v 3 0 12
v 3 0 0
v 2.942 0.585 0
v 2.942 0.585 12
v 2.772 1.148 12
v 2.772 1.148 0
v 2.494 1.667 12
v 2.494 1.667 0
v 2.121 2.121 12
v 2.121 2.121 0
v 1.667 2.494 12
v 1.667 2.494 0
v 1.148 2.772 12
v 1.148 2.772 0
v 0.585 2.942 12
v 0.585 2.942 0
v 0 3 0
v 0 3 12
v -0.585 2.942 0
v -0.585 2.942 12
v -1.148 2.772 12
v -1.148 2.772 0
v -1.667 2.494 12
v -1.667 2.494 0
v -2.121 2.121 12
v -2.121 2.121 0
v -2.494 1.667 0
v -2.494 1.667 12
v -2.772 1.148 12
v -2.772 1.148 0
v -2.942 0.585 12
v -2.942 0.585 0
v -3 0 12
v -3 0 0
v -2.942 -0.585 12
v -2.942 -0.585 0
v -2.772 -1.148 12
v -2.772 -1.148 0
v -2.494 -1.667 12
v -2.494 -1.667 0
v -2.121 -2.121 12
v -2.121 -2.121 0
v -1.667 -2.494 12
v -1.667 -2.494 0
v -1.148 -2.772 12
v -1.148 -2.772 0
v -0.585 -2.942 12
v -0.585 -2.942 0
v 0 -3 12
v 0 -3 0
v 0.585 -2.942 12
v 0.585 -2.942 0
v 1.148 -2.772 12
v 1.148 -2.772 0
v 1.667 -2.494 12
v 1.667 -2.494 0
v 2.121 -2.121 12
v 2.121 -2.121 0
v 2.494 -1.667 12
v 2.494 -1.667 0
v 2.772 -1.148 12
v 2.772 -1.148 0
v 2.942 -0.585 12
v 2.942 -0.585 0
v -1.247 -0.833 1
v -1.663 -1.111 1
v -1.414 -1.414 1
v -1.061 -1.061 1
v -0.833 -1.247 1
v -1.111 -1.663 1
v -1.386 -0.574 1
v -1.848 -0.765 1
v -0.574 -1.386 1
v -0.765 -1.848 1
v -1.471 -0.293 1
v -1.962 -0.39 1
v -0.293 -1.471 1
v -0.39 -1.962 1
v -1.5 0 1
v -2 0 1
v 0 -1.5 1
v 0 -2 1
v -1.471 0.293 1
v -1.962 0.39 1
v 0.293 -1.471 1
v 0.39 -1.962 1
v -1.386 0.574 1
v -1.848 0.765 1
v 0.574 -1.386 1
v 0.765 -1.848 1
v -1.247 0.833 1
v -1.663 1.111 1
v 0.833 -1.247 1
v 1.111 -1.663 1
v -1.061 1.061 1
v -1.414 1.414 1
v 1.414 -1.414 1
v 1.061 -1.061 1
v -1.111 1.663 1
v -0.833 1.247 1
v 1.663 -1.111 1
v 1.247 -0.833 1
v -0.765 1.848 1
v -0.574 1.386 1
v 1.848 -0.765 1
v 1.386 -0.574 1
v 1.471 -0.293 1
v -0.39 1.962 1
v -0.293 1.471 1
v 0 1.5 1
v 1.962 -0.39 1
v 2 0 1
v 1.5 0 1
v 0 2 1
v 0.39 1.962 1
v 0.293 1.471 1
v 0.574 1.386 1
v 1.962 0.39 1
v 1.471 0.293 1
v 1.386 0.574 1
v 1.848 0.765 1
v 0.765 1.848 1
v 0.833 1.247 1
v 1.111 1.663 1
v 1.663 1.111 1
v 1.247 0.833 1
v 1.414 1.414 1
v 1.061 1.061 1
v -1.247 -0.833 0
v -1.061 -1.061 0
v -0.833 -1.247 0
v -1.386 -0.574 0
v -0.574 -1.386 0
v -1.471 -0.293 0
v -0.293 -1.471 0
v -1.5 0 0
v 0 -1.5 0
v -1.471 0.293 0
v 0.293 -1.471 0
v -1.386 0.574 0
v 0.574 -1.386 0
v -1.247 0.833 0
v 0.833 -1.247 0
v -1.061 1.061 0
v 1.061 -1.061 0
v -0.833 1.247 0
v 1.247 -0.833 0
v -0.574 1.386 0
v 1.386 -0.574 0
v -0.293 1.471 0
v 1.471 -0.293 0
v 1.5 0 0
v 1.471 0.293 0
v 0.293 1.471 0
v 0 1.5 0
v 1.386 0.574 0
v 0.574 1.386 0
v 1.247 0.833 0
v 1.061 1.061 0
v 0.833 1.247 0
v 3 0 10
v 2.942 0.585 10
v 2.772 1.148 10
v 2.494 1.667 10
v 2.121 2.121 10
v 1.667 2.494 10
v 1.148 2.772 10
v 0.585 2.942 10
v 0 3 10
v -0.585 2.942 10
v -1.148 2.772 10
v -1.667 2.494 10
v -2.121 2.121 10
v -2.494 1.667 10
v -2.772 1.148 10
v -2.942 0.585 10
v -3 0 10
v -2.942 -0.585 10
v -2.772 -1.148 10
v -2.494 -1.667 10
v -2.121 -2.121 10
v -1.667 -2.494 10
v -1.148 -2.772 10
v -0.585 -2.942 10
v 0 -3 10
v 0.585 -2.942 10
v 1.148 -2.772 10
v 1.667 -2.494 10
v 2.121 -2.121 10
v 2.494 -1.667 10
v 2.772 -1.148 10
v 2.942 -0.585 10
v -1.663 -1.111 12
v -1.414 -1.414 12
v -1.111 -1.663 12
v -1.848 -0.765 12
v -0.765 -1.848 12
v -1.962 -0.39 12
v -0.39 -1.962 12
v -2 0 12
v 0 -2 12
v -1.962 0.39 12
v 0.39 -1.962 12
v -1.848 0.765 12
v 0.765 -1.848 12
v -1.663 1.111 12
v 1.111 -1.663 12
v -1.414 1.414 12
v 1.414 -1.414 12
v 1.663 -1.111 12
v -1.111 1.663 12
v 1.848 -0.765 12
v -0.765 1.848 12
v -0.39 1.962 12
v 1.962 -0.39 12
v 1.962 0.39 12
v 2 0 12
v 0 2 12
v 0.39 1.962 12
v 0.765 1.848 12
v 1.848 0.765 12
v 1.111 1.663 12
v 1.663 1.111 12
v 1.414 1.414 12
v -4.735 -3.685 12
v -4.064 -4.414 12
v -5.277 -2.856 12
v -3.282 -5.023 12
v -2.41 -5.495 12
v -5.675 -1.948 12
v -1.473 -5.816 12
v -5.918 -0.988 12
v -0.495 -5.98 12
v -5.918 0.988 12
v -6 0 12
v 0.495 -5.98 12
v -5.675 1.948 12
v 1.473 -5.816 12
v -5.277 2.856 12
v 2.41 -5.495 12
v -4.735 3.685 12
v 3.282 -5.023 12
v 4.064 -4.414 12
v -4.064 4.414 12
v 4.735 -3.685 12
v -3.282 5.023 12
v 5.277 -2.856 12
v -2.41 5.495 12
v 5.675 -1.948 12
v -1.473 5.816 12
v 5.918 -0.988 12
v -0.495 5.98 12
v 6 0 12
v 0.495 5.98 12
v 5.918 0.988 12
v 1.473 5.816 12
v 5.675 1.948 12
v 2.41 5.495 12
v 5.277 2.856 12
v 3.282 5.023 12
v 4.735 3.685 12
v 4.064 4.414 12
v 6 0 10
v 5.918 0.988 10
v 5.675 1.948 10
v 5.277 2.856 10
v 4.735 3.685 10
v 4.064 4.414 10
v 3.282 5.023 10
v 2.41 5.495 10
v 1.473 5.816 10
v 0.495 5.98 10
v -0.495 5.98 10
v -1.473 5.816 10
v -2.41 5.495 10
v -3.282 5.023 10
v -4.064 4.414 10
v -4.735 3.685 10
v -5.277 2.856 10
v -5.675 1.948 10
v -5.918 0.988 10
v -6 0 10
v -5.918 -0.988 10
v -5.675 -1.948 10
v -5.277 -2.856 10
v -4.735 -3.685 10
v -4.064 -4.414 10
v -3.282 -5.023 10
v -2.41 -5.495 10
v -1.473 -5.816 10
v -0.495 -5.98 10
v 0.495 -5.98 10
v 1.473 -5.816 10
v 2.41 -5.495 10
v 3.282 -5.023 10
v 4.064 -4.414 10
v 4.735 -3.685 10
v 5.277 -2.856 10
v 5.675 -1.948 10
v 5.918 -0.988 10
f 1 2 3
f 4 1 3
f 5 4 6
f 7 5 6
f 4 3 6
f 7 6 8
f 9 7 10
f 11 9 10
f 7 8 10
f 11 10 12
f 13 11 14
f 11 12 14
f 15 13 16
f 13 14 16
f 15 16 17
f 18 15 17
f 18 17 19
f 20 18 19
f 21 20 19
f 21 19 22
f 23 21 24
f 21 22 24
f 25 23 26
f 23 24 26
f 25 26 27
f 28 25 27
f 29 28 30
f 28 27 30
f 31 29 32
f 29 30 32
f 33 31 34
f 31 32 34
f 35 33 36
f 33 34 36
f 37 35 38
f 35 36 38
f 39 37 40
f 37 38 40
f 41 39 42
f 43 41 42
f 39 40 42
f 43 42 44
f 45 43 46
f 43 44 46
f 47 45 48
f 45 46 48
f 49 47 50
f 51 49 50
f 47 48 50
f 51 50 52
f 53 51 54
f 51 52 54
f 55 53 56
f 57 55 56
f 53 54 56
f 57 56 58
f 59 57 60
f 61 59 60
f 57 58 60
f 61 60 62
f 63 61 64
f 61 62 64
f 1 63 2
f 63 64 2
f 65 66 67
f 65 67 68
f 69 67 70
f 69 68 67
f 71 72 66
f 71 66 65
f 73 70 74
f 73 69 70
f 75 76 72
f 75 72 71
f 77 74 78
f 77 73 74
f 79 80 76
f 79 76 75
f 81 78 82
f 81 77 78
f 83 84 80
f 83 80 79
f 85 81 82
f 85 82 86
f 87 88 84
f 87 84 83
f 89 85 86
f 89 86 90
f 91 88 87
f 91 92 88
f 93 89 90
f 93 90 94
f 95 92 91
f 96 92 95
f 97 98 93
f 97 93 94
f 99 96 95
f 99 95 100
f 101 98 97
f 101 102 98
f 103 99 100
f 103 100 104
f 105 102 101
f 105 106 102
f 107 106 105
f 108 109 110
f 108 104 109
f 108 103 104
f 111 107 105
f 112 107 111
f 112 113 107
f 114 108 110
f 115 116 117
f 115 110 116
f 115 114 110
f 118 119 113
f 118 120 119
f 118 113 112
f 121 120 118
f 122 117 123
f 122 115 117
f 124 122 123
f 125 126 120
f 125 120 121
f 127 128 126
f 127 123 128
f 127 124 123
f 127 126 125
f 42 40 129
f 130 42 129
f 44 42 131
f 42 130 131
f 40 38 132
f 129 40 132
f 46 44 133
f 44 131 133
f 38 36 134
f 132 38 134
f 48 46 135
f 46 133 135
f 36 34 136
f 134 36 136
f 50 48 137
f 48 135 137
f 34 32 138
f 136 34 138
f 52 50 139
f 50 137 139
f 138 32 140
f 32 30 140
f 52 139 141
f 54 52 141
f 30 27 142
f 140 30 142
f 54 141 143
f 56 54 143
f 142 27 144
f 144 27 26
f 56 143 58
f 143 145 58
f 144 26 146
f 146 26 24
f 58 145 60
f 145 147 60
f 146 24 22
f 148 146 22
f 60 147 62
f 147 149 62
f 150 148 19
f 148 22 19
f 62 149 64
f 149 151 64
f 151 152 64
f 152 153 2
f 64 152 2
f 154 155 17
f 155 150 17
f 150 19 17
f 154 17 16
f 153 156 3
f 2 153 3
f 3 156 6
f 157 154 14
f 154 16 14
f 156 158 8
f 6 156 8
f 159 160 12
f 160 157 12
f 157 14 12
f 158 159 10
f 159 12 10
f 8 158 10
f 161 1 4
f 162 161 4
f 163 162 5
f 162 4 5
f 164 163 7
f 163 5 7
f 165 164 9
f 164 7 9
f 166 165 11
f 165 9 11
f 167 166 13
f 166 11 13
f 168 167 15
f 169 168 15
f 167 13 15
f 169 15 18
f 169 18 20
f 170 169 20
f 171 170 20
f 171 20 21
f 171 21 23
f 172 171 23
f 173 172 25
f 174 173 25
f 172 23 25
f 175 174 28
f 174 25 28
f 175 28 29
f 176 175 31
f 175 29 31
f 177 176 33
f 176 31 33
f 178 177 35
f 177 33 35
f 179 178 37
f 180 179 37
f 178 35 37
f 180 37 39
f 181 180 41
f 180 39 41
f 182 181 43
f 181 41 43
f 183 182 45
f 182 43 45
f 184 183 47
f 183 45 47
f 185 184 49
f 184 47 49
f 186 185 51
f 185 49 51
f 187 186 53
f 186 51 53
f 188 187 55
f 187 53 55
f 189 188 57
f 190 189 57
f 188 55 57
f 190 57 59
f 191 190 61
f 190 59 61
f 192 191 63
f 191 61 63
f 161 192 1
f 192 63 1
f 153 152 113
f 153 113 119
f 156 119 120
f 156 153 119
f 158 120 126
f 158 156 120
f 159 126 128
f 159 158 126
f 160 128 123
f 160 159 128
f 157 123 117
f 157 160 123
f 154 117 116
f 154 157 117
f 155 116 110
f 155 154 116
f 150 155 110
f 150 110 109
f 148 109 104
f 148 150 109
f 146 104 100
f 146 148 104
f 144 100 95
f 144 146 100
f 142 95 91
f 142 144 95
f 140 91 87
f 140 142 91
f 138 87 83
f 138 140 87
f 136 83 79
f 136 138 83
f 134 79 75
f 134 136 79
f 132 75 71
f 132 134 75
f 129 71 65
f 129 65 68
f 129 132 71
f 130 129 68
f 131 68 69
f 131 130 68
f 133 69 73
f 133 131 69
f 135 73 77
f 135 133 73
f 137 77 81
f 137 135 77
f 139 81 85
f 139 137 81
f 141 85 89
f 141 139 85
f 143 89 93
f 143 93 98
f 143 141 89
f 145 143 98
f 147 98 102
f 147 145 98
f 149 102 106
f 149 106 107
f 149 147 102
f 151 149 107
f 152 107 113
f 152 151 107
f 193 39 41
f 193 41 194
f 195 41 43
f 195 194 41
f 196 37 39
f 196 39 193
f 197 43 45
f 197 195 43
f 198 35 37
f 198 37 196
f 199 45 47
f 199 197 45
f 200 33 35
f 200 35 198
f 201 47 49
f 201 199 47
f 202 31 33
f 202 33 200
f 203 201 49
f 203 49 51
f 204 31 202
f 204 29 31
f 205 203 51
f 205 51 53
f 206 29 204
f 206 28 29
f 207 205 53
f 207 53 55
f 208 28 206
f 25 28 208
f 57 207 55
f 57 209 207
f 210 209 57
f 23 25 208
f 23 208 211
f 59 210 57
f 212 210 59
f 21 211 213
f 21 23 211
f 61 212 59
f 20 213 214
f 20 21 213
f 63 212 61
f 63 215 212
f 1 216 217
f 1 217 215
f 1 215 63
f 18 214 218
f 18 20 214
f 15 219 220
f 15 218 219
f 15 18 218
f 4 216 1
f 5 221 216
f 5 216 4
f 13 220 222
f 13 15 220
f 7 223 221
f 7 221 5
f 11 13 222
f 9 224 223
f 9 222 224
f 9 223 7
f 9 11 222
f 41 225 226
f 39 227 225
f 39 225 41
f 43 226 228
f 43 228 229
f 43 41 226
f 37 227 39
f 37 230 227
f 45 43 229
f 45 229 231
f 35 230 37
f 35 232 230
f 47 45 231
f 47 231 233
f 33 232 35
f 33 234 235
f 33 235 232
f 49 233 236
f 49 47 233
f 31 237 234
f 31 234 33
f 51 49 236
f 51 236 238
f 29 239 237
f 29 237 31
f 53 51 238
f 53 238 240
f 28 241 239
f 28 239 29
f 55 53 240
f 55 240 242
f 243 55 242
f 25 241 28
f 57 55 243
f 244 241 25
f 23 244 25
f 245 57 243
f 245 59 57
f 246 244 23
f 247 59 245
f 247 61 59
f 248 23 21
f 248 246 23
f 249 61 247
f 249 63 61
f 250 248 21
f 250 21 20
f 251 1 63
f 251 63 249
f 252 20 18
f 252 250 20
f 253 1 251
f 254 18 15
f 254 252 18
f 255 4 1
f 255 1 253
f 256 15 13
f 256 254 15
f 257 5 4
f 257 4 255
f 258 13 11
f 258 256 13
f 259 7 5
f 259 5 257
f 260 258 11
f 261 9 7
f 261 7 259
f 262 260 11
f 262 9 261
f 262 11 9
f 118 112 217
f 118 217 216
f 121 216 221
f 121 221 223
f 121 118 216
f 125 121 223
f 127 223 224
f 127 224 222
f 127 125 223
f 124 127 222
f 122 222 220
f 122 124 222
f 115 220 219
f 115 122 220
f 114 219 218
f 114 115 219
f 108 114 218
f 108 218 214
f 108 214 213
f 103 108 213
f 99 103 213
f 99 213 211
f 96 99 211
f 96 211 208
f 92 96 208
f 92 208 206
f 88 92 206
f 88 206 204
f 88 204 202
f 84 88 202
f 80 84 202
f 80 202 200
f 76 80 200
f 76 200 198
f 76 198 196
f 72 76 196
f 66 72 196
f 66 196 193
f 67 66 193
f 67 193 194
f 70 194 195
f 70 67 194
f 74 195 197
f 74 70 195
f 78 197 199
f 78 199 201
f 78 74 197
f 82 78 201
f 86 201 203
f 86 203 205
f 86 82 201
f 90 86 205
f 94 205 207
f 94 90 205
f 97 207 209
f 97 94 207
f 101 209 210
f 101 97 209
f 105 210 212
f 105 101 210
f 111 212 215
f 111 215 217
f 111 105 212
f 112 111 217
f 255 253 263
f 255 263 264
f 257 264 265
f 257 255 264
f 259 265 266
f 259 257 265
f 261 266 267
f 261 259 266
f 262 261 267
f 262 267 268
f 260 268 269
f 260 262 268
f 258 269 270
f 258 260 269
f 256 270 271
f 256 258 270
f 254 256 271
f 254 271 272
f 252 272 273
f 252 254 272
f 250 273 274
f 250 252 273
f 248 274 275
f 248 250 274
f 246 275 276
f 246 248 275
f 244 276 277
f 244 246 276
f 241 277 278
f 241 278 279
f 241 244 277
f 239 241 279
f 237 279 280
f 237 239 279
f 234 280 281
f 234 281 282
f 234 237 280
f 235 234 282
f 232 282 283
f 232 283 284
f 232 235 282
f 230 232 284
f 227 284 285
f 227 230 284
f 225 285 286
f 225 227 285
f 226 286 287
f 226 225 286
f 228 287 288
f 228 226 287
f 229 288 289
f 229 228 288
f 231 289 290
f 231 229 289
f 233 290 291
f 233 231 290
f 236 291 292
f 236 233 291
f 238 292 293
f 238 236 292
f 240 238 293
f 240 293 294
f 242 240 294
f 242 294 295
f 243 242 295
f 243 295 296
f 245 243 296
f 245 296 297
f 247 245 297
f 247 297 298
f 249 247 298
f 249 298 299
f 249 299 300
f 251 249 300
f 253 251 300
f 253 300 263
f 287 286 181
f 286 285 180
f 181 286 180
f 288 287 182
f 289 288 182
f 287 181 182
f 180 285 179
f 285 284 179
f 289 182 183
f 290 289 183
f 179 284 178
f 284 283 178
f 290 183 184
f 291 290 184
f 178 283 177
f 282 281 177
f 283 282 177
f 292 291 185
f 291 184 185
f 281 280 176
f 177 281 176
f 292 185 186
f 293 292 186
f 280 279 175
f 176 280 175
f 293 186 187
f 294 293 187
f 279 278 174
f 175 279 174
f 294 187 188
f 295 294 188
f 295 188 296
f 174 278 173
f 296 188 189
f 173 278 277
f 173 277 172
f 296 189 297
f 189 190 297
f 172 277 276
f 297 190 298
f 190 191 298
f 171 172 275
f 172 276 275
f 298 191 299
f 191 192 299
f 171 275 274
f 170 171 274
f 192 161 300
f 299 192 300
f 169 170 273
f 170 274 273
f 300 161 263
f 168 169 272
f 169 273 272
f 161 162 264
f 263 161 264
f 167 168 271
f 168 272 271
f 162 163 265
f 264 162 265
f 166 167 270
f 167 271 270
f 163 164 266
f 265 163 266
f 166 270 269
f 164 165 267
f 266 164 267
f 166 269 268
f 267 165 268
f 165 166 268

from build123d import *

# Parameters (mm, degrees)
F0_R     = 3
F0_R_2   = 2
F1_DEPTH = 12
F0_R_3   = 1.5
F2_DEPTH = 1
F3_R     = 6
F3_R_2   = 3
F4_DEPTH = 2


with BuildPart() as f1:
    # F0 (on Top) → F1 (new body)
    with BuildSketch(Plane.XY):
        Circle(F0_R)
        Circle(F0_R_2, mode=Mode.SUBTRACT)
    extrude(amount=F1_DEPTH)

    # F0 (on Top) → F2 (join)
    with BuildSketch(Plane.XY):
        Circle(F0_R_2)
        Circle(F0_R_3, mode=Mode.SUBTRACT)
    extrude(amount=F2_DEPTH)


with BuildPart() as f4:
    # F3 (on face) → F4 (new body)
    with BuildSketch(Plane.XY.offset(12)):
        Circle(F3_R)
        Circle(F3_R_2, mode=Mode.SUBTRACT)
    extrude(amount=-F4_DEPTH)


solid = Compound([f1.part, f4.part])
